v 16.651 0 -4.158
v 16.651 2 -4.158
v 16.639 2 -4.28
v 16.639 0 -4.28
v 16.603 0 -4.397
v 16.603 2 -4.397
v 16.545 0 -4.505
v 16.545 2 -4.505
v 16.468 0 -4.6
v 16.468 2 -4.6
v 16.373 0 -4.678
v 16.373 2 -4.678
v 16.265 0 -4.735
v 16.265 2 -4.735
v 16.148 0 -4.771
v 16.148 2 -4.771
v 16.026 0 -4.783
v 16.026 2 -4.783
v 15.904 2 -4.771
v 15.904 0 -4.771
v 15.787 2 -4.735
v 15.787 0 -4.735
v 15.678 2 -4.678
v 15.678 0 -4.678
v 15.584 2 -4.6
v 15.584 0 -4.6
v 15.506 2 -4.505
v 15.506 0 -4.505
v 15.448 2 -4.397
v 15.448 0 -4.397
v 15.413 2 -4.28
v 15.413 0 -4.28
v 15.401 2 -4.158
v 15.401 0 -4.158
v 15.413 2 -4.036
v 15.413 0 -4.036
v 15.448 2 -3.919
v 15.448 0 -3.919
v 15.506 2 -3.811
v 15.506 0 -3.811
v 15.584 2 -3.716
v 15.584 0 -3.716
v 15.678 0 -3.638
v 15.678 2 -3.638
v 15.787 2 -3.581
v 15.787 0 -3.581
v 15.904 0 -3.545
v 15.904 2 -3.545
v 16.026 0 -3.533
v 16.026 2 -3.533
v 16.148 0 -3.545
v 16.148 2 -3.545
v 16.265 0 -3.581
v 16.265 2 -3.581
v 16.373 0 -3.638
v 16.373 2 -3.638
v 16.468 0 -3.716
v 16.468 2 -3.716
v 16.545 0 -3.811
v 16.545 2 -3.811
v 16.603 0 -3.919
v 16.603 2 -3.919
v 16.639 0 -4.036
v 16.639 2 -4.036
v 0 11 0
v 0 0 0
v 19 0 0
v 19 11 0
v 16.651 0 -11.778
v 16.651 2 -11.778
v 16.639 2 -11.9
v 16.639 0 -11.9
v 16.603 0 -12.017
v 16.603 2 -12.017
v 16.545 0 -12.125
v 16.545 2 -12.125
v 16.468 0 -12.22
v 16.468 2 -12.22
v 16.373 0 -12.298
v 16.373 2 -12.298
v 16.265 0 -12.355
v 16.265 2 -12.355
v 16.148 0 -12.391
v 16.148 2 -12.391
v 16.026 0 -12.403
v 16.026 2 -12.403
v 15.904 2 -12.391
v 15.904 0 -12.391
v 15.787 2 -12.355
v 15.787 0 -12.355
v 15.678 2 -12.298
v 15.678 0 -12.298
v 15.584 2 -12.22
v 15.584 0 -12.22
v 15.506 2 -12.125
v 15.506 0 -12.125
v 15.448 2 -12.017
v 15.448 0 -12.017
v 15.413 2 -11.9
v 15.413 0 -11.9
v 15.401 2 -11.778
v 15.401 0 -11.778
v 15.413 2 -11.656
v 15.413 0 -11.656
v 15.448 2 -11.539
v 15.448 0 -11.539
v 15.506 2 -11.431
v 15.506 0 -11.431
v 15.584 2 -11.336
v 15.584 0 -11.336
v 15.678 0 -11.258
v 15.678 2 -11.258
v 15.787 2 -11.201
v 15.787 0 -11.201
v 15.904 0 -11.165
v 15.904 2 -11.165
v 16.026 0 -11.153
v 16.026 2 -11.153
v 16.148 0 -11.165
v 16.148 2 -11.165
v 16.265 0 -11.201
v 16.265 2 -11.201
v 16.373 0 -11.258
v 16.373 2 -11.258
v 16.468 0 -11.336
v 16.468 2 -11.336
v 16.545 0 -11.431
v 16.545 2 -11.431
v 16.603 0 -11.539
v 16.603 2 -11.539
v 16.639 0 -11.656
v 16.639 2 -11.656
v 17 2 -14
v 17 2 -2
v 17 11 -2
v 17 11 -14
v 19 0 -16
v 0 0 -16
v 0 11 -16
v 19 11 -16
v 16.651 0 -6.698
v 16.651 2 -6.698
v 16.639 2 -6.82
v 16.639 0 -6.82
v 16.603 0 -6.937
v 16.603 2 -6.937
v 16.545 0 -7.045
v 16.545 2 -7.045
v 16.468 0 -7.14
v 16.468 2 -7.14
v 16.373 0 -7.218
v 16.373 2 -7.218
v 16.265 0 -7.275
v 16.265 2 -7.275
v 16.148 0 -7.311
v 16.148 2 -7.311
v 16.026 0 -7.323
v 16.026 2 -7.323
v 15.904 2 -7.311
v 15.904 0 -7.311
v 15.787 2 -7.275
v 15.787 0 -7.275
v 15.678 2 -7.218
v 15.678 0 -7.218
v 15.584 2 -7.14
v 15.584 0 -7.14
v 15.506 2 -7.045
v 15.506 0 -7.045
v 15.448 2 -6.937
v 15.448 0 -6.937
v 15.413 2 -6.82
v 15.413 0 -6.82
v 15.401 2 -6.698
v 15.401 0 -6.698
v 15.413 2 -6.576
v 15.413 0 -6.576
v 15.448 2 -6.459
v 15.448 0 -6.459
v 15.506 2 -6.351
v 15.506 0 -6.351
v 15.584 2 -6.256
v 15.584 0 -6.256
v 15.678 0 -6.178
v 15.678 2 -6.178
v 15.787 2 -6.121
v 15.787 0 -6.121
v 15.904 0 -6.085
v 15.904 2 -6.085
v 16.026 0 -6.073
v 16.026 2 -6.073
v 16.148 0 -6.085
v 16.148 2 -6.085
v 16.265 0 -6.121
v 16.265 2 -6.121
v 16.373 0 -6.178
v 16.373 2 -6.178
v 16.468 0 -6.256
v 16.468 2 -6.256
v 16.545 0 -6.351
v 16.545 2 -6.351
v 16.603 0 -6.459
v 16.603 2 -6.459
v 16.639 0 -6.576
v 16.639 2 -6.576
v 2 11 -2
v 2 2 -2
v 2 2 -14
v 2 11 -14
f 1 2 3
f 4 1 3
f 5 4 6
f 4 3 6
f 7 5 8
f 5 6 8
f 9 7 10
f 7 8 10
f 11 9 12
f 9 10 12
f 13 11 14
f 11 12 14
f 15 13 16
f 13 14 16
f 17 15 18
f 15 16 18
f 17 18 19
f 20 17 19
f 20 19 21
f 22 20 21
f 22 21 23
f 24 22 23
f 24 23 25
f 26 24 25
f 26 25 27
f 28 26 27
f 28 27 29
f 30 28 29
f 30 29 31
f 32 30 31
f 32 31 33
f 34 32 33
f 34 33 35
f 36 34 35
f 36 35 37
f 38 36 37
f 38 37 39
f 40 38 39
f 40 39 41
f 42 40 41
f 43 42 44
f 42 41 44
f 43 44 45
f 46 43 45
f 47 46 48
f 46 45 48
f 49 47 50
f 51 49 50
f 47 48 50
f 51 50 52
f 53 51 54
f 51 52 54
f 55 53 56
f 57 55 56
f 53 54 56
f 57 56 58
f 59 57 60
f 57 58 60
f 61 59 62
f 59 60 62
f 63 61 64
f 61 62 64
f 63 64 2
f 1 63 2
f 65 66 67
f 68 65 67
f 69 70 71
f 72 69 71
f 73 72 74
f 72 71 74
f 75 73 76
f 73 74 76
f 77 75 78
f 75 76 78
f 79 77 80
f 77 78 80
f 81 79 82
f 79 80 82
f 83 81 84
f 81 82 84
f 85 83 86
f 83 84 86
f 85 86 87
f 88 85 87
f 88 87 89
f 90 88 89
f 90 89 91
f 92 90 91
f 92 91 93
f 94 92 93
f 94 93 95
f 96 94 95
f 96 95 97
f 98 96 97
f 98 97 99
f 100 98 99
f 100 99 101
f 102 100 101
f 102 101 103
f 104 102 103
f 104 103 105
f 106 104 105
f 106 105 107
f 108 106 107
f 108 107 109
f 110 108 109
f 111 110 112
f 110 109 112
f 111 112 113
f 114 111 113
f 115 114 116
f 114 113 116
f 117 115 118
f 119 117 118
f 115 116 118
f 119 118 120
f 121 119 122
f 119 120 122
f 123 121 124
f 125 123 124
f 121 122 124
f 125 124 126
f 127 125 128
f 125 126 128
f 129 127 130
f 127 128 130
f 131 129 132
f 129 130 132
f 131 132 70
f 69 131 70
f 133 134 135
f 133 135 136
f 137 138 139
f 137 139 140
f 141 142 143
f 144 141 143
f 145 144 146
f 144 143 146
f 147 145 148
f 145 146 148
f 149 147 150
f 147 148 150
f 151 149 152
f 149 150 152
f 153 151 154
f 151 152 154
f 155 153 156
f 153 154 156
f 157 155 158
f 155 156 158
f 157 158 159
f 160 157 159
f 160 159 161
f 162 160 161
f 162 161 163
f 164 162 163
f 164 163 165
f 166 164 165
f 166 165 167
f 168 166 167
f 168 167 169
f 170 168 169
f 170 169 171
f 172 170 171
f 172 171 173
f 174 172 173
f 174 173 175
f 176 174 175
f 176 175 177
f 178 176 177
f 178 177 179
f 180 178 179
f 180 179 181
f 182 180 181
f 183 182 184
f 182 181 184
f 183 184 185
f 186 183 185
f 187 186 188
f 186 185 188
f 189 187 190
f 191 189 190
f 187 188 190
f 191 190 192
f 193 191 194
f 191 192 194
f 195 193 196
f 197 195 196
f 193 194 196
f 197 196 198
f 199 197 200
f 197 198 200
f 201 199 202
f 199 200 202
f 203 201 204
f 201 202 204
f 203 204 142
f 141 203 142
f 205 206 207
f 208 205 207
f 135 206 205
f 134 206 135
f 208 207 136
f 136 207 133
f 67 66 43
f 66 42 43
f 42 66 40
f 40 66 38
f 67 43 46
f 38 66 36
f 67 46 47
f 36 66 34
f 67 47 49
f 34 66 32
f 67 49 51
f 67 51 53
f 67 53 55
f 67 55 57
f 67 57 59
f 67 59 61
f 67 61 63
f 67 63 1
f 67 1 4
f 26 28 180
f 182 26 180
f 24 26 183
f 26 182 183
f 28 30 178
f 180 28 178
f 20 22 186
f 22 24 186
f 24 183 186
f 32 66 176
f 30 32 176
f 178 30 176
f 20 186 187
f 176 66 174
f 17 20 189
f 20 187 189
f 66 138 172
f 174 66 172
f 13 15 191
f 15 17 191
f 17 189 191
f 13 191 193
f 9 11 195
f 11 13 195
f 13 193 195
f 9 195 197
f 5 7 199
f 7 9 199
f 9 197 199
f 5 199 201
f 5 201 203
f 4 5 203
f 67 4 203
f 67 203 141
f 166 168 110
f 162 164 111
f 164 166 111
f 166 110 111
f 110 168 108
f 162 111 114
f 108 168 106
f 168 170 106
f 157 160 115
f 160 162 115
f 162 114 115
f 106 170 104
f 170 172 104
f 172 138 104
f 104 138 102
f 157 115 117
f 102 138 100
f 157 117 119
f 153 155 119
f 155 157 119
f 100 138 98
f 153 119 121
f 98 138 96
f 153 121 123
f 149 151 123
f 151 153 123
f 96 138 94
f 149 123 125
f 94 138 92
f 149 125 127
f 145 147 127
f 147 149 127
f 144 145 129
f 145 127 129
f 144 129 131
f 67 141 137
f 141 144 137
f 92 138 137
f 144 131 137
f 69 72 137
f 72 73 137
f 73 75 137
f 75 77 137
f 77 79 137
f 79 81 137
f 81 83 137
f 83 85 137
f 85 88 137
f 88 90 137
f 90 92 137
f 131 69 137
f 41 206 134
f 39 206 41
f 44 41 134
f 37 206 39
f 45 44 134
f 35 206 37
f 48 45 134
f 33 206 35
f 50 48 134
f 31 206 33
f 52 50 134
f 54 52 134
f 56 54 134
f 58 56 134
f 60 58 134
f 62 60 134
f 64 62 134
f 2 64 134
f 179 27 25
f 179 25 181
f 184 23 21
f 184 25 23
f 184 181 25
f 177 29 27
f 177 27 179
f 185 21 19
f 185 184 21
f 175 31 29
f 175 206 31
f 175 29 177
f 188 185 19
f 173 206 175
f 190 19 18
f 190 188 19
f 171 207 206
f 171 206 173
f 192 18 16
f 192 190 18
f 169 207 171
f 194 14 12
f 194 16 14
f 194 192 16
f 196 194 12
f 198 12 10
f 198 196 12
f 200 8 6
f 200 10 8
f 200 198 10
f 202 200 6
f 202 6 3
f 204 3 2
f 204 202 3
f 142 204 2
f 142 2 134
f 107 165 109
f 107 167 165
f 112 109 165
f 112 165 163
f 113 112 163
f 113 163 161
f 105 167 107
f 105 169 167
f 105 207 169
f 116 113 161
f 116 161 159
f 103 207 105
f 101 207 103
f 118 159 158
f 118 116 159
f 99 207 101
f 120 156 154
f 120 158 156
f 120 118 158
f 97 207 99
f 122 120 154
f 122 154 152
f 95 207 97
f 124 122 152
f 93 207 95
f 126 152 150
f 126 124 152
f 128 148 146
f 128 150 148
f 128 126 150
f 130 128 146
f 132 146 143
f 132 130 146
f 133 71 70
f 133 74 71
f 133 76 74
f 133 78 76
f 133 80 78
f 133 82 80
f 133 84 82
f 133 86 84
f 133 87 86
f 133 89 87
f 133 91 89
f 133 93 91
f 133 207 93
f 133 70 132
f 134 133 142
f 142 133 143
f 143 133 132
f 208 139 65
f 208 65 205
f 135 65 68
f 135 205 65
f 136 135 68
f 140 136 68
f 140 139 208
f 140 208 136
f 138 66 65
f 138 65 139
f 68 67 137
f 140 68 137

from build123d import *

# Parameters (mm, degrees)
SKETCH1_W           = 19
SKETCH1_H           = 16
BOSS_EXTRUDE1_DEPTH = 11
SHELL1_T            = -2
SKETCH2_R           = 0.625
CUT_EXTRUDE1_DEPTH  = 10


with BuildPart() as part:
    # Sketch1 → Boss-Extrude1 (new body)
    with BuildSketch(Plane(origin=(0, 0, 0), x_dir=(1, 0, 0), z_dir=(0, 1, 0))):
        with Locations((9.5, 8)):
            Rectangle(SKETCH1_W, SKETCH1_H)
    extrude(amount=BOSS_EXTRUDE1_DEPTH)

    # Shell1
    shell1_openings = [part.faces().sort_by_distance(p)[0] for p in [
        (9.5, 11, -8),
    ]]
    offset(amount=SHELL1_T, openings=shell1_openings, kind=Kind.INTERSECTION)

    # Sketch2 → Cut-Extrude1 (cut)
    with BuildSketch(Plane(origin=(0, 2, 0), x_dir=(1, 0, 0), z_dir=(0, 1, 0))):
        with Locations((16.025684832, 11.778007382)):
            Circle(SKETCH2_R)
        with Locations((16.025684832, 6.698007382)):
            Circle(SKETCH2_R)
        with Locations((16.025684832, 4.158007382)):
            Circle(SKETCH2_R)
    extrude(amount=-CUT_EXTRUDE1_DEPTH, mode=Mode.SUBTRACT)


solid = part.part
